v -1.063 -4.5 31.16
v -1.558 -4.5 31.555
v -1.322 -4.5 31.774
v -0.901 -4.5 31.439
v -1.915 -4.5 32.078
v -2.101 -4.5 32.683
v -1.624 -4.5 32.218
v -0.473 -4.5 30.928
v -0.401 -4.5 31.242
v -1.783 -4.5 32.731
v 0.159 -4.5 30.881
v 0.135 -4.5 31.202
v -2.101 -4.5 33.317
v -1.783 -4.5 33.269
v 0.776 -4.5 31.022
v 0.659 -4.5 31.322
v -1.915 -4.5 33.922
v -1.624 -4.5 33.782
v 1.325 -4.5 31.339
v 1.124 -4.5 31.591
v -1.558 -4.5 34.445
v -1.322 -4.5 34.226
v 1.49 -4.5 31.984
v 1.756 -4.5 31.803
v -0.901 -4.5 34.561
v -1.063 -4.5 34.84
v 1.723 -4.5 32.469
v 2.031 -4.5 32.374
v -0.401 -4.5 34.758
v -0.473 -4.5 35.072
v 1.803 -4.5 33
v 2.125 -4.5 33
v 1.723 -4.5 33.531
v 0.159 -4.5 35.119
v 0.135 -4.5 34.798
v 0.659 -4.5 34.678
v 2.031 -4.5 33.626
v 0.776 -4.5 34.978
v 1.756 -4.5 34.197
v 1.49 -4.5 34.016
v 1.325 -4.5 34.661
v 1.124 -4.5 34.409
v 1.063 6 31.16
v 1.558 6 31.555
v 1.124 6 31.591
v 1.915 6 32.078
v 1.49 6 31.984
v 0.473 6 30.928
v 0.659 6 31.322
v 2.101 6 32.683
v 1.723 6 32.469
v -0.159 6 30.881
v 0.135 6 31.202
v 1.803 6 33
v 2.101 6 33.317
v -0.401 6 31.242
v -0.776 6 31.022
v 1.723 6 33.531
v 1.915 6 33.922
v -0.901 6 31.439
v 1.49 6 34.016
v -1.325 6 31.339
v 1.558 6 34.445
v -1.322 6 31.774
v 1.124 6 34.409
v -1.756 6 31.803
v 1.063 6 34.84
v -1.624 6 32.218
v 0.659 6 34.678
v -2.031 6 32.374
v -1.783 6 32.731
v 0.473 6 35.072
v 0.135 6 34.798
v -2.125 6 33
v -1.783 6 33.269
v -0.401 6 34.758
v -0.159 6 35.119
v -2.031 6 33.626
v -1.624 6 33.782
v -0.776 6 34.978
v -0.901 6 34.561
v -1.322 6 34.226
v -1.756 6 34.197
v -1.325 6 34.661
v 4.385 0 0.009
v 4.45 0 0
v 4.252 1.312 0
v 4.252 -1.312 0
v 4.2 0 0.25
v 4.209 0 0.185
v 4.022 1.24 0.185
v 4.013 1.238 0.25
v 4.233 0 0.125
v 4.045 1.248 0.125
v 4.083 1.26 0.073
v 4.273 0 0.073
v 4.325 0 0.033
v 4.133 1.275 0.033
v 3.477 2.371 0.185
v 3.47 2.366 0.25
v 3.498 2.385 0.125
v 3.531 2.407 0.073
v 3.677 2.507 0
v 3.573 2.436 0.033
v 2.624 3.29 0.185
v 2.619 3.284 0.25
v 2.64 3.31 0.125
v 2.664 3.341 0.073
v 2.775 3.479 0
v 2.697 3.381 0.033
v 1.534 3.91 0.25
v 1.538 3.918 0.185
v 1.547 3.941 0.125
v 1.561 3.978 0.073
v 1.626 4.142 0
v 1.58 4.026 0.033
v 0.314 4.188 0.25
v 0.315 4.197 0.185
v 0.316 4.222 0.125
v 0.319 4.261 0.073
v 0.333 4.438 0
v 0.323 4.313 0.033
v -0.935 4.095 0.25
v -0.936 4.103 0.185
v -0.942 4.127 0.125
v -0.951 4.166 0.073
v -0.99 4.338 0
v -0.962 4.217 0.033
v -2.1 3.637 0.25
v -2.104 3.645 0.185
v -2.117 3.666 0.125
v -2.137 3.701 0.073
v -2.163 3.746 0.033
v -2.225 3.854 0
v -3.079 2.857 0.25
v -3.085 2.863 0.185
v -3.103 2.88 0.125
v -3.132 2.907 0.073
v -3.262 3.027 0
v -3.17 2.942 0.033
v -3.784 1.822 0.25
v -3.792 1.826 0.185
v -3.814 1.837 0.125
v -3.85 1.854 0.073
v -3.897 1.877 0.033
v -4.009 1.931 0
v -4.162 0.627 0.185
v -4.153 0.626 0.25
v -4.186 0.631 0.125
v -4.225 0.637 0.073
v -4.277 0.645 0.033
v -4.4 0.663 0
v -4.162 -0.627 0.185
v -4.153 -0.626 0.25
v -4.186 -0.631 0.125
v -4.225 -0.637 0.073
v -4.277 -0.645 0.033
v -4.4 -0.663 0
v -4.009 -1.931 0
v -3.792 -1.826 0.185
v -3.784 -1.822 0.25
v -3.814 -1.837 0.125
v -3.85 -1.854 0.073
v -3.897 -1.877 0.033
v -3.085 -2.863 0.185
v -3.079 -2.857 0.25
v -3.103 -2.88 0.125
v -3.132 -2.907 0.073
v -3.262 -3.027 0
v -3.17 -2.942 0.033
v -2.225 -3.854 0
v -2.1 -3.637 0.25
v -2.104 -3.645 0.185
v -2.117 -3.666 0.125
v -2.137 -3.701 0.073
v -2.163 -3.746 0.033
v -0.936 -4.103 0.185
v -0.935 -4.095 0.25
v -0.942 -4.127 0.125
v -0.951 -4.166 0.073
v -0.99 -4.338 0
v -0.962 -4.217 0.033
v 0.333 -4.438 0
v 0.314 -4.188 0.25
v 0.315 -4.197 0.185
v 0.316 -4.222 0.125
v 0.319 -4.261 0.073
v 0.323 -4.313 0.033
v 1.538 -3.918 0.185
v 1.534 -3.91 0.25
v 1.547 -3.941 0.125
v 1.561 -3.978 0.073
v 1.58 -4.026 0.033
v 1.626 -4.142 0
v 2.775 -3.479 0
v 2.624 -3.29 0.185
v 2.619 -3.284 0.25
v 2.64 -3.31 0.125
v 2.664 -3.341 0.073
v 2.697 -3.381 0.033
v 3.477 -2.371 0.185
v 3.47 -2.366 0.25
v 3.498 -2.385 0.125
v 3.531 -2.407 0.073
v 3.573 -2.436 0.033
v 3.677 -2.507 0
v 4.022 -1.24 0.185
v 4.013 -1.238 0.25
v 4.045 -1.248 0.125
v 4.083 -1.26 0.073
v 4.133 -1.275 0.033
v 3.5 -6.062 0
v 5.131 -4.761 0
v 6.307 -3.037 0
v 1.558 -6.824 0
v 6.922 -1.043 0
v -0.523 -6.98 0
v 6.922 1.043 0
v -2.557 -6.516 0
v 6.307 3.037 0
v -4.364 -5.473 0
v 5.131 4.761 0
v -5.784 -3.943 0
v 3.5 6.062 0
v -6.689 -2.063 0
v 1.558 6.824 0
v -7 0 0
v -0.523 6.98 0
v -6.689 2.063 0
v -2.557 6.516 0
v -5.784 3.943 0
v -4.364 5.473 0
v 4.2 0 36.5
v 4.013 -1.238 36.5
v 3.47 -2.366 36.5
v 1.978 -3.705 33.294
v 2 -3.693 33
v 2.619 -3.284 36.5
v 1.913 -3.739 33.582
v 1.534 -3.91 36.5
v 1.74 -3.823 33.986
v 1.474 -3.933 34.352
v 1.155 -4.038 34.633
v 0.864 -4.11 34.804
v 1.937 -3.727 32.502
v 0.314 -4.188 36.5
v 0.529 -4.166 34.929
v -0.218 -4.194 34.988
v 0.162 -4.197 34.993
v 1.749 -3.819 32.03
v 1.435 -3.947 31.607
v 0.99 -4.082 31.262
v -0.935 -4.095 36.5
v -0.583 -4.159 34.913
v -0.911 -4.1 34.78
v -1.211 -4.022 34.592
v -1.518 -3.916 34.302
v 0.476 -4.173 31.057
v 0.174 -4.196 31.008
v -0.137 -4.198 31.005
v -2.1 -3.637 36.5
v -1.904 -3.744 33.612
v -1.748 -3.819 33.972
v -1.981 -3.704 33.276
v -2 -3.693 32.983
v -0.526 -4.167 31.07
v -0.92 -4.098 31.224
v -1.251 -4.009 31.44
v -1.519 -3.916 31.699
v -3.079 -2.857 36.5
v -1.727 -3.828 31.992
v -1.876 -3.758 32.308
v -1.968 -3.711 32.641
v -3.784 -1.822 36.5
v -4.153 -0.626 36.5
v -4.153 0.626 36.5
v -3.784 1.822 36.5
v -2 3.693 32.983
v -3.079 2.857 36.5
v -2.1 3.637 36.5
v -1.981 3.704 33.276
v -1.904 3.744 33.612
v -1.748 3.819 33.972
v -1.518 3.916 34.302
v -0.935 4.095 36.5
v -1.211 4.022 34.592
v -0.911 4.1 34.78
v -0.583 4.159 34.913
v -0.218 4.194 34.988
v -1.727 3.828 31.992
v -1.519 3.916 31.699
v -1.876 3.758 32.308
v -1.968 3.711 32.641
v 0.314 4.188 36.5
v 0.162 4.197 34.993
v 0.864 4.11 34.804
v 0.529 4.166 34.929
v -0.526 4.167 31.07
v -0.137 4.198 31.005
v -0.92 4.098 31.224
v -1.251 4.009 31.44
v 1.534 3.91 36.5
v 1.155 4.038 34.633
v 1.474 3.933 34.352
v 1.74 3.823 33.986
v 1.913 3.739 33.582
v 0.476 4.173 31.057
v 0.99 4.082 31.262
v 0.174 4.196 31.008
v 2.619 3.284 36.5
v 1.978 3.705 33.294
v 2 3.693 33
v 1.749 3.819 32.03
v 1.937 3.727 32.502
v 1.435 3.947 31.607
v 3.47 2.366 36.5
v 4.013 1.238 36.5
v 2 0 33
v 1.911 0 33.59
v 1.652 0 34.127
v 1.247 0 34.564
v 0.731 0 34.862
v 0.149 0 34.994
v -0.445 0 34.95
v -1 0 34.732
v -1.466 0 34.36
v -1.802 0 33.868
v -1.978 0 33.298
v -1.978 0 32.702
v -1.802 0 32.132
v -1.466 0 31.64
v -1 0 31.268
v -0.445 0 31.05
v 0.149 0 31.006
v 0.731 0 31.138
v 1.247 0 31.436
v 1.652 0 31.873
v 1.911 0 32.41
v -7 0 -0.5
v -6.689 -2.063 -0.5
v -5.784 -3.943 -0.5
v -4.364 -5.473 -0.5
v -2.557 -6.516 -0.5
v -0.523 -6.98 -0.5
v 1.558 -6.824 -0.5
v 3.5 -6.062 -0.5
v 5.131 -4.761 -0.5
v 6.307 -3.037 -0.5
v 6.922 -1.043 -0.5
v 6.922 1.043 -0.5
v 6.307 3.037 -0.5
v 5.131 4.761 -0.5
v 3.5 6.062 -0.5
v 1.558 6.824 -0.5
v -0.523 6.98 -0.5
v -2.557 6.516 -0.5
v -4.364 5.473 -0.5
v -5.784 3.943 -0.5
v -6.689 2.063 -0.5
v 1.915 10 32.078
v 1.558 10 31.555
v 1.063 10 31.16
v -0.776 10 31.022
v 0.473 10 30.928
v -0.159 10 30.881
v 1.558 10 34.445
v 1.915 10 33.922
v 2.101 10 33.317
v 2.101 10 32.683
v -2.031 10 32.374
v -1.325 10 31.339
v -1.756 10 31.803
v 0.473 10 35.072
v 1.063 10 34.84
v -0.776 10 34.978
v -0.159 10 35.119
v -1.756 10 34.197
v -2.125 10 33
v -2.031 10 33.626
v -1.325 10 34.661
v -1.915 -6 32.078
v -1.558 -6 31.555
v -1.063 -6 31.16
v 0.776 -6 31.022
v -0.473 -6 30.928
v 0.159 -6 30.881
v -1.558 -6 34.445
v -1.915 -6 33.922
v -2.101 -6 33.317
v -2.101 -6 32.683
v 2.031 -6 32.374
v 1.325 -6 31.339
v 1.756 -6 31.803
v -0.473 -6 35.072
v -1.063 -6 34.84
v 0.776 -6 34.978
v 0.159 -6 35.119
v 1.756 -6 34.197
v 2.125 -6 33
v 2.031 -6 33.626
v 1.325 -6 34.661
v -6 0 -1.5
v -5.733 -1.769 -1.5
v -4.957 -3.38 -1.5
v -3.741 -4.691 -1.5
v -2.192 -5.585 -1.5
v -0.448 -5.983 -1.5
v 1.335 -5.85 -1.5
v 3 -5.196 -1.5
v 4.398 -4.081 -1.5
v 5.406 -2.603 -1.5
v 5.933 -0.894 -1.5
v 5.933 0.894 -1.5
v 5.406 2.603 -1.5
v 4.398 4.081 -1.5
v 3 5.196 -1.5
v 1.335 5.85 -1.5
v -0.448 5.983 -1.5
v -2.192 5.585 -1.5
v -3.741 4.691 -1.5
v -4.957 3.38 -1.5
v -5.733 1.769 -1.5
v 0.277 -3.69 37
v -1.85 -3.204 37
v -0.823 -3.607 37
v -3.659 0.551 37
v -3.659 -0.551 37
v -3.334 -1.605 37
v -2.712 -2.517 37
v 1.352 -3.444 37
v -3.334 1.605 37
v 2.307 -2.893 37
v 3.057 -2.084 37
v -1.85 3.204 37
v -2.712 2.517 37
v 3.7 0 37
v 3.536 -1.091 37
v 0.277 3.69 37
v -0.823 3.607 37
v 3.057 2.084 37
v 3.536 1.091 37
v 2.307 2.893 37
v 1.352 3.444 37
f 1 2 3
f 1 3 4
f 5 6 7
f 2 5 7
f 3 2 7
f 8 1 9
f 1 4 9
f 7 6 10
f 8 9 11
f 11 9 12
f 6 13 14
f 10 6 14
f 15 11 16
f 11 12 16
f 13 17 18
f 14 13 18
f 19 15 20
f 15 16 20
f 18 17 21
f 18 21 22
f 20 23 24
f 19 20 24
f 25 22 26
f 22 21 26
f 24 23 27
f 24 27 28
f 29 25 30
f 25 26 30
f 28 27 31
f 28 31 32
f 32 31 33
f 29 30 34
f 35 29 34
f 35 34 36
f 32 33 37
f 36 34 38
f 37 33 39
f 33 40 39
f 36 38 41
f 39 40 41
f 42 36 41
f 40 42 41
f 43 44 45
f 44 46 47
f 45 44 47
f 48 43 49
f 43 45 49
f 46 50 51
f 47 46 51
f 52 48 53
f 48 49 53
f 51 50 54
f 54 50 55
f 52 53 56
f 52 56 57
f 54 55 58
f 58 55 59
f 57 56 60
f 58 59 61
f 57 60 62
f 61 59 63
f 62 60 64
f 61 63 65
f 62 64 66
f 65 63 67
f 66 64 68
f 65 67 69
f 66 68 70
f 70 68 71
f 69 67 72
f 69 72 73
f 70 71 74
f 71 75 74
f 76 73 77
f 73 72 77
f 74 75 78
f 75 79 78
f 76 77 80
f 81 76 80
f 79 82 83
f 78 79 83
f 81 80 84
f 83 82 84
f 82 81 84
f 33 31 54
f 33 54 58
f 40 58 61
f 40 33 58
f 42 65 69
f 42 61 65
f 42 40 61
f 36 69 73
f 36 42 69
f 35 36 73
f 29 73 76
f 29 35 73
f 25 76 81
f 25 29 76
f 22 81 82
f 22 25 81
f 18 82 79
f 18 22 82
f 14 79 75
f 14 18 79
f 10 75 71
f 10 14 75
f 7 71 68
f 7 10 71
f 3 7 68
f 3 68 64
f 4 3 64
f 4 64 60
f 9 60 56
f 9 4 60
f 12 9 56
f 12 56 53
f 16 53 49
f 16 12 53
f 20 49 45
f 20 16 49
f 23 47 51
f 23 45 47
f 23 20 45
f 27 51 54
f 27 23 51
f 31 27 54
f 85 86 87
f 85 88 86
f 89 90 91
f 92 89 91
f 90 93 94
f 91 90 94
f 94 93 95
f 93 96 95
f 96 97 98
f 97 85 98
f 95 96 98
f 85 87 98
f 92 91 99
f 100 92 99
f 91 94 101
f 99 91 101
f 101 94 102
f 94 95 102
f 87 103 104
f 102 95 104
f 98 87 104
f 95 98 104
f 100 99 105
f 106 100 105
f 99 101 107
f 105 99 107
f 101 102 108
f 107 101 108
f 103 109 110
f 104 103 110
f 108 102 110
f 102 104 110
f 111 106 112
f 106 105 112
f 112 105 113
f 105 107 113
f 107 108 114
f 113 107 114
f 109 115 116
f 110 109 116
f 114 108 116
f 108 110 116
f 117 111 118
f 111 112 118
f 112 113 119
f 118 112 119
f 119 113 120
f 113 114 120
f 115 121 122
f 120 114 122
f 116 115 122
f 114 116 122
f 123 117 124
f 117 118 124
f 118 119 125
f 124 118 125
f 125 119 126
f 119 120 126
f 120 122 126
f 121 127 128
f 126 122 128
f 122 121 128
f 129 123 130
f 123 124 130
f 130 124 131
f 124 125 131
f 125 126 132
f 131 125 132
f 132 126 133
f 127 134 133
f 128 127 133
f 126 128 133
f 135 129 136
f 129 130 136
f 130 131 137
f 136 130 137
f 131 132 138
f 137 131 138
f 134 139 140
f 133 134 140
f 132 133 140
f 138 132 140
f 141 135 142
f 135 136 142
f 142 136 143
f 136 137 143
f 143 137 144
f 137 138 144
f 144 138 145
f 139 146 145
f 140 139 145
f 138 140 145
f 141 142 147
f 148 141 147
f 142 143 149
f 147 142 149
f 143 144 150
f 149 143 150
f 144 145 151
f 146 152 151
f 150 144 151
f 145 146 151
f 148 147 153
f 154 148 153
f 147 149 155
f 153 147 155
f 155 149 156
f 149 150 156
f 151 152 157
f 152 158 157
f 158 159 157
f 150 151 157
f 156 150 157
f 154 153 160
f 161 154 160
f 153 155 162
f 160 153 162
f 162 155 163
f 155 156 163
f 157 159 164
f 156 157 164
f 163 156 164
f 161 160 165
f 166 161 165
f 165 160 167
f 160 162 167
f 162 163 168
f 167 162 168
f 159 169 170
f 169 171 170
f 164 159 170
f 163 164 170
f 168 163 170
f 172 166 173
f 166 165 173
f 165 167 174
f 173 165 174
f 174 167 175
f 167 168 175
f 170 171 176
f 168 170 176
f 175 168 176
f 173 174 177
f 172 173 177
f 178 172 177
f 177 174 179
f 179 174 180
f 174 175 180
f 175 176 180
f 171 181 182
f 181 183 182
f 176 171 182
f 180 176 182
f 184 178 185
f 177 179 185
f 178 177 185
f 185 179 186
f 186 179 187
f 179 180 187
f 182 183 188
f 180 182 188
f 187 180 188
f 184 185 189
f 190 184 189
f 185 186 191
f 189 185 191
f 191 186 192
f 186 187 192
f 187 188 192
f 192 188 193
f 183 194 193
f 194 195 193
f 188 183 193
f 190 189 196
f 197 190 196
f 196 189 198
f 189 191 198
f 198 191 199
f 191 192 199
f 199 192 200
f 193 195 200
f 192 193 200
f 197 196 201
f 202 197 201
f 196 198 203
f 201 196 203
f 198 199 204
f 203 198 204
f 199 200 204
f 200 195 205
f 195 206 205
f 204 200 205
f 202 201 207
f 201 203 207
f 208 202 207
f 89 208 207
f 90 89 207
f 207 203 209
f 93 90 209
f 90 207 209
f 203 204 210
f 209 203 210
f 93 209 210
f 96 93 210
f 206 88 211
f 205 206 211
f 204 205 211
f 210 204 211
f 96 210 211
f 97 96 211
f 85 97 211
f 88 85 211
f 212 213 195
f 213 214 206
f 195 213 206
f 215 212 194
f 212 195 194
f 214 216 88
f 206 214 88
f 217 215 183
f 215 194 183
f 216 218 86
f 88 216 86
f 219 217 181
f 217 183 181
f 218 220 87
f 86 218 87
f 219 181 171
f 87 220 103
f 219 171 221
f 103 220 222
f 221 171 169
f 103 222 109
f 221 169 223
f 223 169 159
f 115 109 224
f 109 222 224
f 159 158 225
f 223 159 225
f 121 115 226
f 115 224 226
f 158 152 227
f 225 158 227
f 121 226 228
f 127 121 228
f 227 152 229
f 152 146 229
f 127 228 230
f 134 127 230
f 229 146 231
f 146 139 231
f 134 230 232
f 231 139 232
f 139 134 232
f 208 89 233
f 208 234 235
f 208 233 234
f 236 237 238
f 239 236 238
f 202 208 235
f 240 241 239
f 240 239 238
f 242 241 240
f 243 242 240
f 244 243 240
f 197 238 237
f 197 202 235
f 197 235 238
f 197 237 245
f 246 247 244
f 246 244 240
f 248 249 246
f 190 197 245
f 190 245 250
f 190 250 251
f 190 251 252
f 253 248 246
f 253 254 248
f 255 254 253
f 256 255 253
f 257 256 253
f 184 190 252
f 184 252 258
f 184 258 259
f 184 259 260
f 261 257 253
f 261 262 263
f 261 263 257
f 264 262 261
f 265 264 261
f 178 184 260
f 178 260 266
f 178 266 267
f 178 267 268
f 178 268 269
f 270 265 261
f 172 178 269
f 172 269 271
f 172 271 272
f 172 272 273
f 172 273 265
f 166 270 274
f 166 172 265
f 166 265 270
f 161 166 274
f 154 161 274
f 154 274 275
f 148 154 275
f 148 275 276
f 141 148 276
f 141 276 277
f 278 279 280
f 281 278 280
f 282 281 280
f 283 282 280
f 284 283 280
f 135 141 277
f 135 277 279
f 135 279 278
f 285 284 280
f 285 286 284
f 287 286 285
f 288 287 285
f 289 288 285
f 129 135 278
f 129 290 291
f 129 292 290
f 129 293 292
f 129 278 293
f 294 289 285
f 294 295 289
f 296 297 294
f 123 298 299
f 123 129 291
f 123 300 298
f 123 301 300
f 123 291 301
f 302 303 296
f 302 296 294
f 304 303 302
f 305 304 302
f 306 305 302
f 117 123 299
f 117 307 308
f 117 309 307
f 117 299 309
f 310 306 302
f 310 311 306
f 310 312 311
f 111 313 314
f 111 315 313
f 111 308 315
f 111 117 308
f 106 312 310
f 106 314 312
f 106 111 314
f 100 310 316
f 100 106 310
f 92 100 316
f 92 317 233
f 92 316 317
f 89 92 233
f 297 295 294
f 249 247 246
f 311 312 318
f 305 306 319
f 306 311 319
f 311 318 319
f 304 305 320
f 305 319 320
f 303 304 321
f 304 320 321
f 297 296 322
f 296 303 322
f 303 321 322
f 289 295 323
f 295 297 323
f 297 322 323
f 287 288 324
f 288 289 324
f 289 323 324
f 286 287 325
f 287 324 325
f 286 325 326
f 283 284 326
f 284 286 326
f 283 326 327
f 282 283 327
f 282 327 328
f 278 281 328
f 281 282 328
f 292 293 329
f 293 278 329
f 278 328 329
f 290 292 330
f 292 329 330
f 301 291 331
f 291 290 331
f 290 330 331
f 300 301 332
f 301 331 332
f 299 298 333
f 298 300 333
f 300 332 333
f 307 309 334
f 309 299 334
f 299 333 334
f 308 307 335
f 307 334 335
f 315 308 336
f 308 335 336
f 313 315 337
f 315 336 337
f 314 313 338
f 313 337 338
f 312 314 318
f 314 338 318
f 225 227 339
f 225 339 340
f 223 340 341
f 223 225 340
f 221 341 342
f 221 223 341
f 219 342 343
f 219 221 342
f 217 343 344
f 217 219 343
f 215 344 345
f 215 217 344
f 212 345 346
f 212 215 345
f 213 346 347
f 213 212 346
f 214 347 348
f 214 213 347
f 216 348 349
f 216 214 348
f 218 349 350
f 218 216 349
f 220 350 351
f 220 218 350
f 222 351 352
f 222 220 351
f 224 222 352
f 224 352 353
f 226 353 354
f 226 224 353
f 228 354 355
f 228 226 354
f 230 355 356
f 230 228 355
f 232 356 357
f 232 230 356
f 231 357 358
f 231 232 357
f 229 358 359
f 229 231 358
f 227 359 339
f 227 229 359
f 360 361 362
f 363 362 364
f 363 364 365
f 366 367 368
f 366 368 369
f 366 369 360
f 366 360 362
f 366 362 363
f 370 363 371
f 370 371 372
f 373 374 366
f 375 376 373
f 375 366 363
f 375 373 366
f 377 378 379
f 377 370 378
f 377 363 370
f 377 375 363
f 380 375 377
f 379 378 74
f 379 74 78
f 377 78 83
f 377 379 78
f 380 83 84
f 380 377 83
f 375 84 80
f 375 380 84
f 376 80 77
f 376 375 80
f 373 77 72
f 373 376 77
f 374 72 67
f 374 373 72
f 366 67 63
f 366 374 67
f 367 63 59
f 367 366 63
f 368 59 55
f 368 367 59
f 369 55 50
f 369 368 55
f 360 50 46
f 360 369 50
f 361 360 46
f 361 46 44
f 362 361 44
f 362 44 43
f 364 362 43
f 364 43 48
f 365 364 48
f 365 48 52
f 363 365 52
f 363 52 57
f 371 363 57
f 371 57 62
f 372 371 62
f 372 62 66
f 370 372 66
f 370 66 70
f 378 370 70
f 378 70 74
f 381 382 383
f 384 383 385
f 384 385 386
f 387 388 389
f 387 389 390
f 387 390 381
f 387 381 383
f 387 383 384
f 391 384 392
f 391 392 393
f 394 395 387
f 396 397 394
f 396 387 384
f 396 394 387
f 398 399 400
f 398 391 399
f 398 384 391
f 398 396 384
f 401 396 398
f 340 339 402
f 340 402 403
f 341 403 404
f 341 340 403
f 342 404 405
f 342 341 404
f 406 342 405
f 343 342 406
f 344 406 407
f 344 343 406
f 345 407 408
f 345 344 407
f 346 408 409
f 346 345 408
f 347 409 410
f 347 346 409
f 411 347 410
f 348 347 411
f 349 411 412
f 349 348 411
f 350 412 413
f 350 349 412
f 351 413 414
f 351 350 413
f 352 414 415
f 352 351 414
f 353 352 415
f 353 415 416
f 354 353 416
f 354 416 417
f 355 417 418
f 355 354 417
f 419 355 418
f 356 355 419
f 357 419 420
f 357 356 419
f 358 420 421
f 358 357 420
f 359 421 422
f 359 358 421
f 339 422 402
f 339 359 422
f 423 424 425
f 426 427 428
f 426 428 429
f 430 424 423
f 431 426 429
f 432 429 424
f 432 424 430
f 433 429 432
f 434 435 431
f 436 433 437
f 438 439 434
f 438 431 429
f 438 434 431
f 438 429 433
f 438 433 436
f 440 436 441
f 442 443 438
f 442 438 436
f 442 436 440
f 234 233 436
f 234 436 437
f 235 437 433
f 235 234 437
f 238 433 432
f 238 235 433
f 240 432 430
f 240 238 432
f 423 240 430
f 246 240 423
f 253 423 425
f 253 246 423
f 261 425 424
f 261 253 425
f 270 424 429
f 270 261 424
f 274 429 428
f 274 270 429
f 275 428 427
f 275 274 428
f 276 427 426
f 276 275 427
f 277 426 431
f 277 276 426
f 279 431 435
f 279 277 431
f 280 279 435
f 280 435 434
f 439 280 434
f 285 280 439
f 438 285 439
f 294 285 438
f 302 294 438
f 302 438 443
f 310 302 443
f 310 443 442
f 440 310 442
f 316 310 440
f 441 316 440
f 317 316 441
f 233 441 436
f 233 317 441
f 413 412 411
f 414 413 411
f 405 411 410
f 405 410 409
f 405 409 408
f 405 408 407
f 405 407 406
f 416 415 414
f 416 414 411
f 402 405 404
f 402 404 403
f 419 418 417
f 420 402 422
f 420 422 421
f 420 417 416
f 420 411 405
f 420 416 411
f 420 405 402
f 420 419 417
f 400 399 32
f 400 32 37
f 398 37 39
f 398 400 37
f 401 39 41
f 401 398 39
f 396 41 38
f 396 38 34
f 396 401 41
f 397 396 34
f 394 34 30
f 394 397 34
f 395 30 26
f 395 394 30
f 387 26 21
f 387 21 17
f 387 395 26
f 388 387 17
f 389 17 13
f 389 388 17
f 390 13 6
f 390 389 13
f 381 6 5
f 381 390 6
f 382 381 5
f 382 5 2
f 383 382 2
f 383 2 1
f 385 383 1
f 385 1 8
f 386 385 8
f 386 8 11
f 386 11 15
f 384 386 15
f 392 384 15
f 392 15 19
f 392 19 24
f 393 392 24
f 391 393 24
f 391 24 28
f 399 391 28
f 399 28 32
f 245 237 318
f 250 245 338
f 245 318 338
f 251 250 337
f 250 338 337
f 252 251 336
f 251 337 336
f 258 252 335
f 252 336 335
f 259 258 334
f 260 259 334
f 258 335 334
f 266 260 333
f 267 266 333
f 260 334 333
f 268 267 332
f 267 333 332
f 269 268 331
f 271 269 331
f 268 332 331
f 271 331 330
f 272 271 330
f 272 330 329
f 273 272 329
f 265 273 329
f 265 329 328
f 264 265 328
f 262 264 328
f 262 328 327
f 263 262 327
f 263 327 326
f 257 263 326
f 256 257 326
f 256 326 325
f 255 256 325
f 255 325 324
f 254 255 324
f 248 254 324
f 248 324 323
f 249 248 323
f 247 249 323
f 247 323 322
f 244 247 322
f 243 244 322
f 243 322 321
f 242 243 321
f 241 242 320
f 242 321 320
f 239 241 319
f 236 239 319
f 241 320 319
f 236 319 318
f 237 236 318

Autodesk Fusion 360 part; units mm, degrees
sketch "Sketch1" plane through (0, 0, 0) normal (0, 0, 1) x (1, 0, 0)
  circle A0 centre (0, 0) radius 4.2
  dimension "d1" = 8.4
extrude "Extrude1" add sketch "Sketch1" along normal blind 37 makes body 1
sketch "Sketch2" plane through (0, 0, 0) normal (0, 0, -1) x (-1, 0, 0)
  circle A0 centre (0, 0) radius 4.2
  circle A1 centre (0, 0) radius 7
  dimension "d4" = 14
extrude "Extrude2" add sketch "Sketch2" along normal blind 1.5 contours A0 | A1 bodies 1
chamfer "Chamfer1" distance 1 angle 45 1 edges at (6.5263, -2.5313, -1.5) on bodies 1
sketch "Sketch3" plane through (0, 0, 0) normal (0, 1, 0) x (1, 0, 0)
  line L0 (7, 0) -> (-7, 0)
  line L1 (-4.2, 0) -> (18, 0) construction
  line L2 (-4.2, -20) -> (18, -20) construction
  line L3 (0, 0) -> (0, -20) construction
  line L4 (0, -20) -> (0, -33) construction
  circle A0 centre (0, -33) radius 2
  point P0 (-4.2, 0)
  dimension "d8" = 20
  dimension "d9" = 4
  dimension "d24" = 13
extrude "Extrude3" cut sketch "Sketch3" along normal through all and the other way through all bodies 1
sketch "Sketch4" plane through (0, 0, 0) normal (0, 1, 0) x (1, 0, 0)
  circle A0 centre (0, -33) radius 1.8028
extrude "Extrude4" add sketch "Sketch4" along normal blind 10 and the other way blind 6 separate body makes body 2
sketch "Sketch5" plane through (0, -6, 0) normal (0, -1, 0) x (1, 0, 0)
  circle A0 centre (0, 33) radius 1.8028
  circle A1 centre (0, 33) radius 2.125
  dimension "d21" = 4.25
extrude "Extrude5" add sketch "Sketch5" against normal blind 1.5 contours A0 | A1 bodies 2
sketch "Sketch6" plane through (0, 10, 0) normal (0, 1, 0) x (-1, 0, 0)
  circle A0 centre (0, 33) radius 1.8028
  circle A1 centre (0, 33) radius 2.125
  circle A2 centre (0, 33) radius 2.125
  circle A3 centre (0, 33) radius 2.125
  dimension "d20" = 4.25
extrude "Extrude6" add sketch "Sketch6" against normal blind 4 bodies 2
chamfer "Chamfer2" distance 0.5 angle 45 1 edges at (-3.9158, -1.5188, 37) on bodies 1
fillet "Fillet1" radius 0.25 1 edges at (-3.9158, -1.5188, 0) on bodies 1
